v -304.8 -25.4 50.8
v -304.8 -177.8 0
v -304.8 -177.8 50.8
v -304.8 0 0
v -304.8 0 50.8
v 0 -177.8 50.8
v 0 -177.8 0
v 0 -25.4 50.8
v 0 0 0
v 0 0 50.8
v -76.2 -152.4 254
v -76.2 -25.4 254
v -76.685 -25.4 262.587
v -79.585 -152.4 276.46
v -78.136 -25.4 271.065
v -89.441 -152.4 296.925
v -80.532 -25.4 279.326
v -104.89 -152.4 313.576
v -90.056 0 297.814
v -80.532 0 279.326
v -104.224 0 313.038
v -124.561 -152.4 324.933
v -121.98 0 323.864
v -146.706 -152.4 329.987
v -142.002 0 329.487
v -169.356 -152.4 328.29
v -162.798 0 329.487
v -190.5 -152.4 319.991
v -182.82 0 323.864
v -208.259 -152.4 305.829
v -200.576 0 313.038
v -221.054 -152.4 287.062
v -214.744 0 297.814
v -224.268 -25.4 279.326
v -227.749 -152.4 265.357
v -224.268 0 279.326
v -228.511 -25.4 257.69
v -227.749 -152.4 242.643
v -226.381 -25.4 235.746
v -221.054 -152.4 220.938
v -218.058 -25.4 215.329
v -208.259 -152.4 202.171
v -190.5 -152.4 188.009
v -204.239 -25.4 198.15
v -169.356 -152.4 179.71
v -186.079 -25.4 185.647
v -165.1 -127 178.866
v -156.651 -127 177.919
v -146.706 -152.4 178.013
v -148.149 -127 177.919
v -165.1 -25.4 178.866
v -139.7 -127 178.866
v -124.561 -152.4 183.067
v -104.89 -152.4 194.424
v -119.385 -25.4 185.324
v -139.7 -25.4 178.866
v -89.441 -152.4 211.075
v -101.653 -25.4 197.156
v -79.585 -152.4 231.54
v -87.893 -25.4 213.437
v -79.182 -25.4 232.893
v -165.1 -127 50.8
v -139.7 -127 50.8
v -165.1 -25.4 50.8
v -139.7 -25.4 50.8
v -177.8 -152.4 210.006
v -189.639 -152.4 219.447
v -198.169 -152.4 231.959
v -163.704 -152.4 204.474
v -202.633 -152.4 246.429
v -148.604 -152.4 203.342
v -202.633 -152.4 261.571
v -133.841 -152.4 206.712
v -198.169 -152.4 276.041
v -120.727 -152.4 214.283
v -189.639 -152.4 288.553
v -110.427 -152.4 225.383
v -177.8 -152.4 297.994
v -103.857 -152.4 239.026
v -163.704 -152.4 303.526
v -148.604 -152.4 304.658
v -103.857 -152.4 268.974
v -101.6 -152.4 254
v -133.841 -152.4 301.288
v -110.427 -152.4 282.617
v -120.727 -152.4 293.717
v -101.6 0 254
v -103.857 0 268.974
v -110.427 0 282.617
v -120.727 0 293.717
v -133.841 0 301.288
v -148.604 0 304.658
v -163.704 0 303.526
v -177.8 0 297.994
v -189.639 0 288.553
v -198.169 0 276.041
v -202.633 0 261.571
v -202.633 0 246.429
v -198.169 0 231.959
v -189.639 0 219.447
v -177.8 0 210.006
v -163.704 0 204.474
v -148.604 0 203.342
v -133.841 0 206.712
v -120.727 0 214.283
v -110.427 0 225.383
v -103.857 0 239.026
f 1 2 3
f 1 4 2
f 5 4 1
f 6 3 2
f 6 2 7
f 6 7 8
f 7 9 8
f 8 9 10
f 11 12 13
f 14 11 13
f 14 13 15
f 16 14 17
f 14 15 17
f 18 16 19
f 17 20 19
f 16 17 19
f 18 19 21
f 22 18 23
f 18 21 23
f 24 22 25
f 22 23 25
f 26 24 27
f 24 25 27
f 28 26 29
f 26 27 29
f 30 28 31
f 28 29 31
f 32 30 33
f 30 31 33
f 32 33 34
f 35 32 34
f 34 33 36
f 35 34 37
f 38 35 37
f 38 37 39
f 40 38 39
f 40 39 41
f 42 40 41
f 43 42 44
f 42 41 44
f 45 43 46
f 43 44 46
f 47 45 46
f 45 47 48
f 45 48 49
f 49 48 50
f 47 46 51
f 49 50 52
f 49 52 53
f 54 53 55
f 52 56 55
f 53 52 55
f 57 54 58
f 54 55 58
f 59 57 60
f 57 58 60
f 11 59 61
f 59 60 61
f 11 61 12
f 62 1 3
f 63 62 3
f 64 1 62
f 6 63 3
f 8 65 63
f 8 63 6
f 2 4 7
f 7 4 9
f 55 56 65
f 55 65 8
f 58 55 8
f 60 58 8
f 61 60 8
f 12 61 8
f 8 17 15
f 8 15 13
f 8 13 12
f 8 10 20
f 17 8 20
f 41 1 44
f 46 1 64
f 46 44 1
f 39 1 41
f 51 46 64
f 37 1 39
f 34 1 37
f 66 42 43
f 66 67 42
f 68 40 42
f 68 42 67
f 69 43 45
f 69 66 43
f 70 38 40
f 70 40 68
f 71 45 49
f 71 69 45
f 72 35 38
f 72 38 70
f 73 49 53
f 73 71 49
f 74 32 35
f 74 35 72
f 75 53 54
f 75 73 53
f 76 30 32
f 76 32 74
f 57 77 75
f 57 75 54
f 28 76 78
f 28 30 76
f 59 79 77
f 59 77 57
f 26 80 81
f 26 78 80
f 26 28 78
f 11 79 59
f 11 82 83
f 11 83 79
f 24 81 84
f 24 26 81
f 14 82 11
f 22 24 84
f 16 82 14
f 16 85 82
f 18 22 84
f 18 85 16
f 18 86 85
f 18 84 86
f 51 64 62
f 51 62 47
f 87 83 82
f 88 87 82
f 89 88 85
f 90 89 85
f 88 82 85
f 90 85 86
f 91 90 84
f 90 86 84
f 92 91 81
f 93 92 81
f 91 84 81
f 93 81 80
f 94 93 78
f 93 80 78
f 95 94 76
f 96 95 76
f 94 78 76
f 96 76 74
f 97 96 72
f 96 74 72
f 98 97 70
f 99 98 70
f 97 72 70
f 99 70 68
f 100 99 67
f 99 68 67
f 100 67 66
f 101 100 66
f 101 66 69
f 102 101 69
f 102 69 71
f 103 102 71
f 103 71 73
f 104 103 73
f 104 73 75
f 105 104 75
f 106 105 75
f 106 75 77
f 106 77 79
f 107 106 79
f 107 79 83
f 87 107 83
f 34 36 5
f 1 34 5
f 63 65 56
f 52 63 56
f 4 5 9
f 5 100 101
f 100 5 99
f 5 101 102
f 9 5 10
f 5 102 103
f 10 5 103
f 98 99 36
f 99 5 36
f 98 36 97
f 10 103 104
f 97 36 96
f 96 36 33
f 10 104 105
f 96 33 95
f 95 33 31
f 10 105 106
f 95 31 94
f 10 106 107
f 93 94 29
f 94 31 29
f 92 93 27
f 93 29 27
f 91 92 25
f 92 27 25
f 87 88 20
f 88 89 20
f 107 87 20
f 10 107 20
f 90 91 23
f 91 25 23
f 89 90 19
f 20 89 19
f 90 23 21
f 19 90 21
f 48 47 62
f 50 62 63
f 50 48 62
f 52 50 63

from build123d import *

# Parameters (mm, degrees)
F2_DEPTH  = 25.4
F3_W      = 304.8
F3_H      = 50.8
F4_DEPTH  = 152.4
F5_W      = 25.4
F5_H      = 203.2
F6_DEPTH  = 101.6
F7_R      = 76.2
F8_DEPTH  = 127
F9_R      = 50.8
F10_DEPTH = 152.401


# Not quite as in the source:
# - a variable given as a bare number and used for a length is read in inches; the dataset says mm whatever the document's units were


with BuildPart() as f2:
    # F1 (on Front) → F2 (new body)
    with BuildSketch(Plane.XZ):
        with BuildLine():
            Line((-304.8, 0), (0, 0))
            Line((0, 0), (0, 50.8))
            Line((0, 50.8), (-80.5318662816, 279.3261002888))
            ThreePointArc((-80.5318662816, 279.3261002888), (-152.4, 330.2), (-224.2681337184, 279.3261002888))
            Line((-224.2681337184, 279.3261002888), (-304.8, 50.8))
            Line((-304.8, 50.8), (-304.8, 0))
        make_face()
    extrude(amount=F2_DEPTH)

    # F3 (on face) → F4 (join)
    with BuildSketch(Plane.XZ.offset(25.4)):
        with Locations((-152.4, 25.4)):
            Rectangle(F3_W, F3_H)
    extrude(amount=F4_DEPTH)

    # F5 (on face) → F6 (join)
    with BuildSketch(Plane.XZ.offset(25.4)):
        with Locations((-152.4, 152.4)):
            Rectangle(F5_W, F5_H)
    extrude(amount=F6_DEPTH)

    # F7 (on face) → F8 (join)
    with BuildSketch(Plane.XZ.offset(25.4)):
        with Locations((-152.4, 254)):
            Circle(F7_R)
    extrude(amount=F8_DEPTH)

    # F9 (on face) → F10 (cut, through all)
    with BuildSketch(Plane.XZ.offset(152.4)):
        with Locations((-152.4, 254)):
            Circle(F9_R)
    extrude(amount=-F10_DEPTH, mode=Mode.SUBTRACT)


solid = f2.part
